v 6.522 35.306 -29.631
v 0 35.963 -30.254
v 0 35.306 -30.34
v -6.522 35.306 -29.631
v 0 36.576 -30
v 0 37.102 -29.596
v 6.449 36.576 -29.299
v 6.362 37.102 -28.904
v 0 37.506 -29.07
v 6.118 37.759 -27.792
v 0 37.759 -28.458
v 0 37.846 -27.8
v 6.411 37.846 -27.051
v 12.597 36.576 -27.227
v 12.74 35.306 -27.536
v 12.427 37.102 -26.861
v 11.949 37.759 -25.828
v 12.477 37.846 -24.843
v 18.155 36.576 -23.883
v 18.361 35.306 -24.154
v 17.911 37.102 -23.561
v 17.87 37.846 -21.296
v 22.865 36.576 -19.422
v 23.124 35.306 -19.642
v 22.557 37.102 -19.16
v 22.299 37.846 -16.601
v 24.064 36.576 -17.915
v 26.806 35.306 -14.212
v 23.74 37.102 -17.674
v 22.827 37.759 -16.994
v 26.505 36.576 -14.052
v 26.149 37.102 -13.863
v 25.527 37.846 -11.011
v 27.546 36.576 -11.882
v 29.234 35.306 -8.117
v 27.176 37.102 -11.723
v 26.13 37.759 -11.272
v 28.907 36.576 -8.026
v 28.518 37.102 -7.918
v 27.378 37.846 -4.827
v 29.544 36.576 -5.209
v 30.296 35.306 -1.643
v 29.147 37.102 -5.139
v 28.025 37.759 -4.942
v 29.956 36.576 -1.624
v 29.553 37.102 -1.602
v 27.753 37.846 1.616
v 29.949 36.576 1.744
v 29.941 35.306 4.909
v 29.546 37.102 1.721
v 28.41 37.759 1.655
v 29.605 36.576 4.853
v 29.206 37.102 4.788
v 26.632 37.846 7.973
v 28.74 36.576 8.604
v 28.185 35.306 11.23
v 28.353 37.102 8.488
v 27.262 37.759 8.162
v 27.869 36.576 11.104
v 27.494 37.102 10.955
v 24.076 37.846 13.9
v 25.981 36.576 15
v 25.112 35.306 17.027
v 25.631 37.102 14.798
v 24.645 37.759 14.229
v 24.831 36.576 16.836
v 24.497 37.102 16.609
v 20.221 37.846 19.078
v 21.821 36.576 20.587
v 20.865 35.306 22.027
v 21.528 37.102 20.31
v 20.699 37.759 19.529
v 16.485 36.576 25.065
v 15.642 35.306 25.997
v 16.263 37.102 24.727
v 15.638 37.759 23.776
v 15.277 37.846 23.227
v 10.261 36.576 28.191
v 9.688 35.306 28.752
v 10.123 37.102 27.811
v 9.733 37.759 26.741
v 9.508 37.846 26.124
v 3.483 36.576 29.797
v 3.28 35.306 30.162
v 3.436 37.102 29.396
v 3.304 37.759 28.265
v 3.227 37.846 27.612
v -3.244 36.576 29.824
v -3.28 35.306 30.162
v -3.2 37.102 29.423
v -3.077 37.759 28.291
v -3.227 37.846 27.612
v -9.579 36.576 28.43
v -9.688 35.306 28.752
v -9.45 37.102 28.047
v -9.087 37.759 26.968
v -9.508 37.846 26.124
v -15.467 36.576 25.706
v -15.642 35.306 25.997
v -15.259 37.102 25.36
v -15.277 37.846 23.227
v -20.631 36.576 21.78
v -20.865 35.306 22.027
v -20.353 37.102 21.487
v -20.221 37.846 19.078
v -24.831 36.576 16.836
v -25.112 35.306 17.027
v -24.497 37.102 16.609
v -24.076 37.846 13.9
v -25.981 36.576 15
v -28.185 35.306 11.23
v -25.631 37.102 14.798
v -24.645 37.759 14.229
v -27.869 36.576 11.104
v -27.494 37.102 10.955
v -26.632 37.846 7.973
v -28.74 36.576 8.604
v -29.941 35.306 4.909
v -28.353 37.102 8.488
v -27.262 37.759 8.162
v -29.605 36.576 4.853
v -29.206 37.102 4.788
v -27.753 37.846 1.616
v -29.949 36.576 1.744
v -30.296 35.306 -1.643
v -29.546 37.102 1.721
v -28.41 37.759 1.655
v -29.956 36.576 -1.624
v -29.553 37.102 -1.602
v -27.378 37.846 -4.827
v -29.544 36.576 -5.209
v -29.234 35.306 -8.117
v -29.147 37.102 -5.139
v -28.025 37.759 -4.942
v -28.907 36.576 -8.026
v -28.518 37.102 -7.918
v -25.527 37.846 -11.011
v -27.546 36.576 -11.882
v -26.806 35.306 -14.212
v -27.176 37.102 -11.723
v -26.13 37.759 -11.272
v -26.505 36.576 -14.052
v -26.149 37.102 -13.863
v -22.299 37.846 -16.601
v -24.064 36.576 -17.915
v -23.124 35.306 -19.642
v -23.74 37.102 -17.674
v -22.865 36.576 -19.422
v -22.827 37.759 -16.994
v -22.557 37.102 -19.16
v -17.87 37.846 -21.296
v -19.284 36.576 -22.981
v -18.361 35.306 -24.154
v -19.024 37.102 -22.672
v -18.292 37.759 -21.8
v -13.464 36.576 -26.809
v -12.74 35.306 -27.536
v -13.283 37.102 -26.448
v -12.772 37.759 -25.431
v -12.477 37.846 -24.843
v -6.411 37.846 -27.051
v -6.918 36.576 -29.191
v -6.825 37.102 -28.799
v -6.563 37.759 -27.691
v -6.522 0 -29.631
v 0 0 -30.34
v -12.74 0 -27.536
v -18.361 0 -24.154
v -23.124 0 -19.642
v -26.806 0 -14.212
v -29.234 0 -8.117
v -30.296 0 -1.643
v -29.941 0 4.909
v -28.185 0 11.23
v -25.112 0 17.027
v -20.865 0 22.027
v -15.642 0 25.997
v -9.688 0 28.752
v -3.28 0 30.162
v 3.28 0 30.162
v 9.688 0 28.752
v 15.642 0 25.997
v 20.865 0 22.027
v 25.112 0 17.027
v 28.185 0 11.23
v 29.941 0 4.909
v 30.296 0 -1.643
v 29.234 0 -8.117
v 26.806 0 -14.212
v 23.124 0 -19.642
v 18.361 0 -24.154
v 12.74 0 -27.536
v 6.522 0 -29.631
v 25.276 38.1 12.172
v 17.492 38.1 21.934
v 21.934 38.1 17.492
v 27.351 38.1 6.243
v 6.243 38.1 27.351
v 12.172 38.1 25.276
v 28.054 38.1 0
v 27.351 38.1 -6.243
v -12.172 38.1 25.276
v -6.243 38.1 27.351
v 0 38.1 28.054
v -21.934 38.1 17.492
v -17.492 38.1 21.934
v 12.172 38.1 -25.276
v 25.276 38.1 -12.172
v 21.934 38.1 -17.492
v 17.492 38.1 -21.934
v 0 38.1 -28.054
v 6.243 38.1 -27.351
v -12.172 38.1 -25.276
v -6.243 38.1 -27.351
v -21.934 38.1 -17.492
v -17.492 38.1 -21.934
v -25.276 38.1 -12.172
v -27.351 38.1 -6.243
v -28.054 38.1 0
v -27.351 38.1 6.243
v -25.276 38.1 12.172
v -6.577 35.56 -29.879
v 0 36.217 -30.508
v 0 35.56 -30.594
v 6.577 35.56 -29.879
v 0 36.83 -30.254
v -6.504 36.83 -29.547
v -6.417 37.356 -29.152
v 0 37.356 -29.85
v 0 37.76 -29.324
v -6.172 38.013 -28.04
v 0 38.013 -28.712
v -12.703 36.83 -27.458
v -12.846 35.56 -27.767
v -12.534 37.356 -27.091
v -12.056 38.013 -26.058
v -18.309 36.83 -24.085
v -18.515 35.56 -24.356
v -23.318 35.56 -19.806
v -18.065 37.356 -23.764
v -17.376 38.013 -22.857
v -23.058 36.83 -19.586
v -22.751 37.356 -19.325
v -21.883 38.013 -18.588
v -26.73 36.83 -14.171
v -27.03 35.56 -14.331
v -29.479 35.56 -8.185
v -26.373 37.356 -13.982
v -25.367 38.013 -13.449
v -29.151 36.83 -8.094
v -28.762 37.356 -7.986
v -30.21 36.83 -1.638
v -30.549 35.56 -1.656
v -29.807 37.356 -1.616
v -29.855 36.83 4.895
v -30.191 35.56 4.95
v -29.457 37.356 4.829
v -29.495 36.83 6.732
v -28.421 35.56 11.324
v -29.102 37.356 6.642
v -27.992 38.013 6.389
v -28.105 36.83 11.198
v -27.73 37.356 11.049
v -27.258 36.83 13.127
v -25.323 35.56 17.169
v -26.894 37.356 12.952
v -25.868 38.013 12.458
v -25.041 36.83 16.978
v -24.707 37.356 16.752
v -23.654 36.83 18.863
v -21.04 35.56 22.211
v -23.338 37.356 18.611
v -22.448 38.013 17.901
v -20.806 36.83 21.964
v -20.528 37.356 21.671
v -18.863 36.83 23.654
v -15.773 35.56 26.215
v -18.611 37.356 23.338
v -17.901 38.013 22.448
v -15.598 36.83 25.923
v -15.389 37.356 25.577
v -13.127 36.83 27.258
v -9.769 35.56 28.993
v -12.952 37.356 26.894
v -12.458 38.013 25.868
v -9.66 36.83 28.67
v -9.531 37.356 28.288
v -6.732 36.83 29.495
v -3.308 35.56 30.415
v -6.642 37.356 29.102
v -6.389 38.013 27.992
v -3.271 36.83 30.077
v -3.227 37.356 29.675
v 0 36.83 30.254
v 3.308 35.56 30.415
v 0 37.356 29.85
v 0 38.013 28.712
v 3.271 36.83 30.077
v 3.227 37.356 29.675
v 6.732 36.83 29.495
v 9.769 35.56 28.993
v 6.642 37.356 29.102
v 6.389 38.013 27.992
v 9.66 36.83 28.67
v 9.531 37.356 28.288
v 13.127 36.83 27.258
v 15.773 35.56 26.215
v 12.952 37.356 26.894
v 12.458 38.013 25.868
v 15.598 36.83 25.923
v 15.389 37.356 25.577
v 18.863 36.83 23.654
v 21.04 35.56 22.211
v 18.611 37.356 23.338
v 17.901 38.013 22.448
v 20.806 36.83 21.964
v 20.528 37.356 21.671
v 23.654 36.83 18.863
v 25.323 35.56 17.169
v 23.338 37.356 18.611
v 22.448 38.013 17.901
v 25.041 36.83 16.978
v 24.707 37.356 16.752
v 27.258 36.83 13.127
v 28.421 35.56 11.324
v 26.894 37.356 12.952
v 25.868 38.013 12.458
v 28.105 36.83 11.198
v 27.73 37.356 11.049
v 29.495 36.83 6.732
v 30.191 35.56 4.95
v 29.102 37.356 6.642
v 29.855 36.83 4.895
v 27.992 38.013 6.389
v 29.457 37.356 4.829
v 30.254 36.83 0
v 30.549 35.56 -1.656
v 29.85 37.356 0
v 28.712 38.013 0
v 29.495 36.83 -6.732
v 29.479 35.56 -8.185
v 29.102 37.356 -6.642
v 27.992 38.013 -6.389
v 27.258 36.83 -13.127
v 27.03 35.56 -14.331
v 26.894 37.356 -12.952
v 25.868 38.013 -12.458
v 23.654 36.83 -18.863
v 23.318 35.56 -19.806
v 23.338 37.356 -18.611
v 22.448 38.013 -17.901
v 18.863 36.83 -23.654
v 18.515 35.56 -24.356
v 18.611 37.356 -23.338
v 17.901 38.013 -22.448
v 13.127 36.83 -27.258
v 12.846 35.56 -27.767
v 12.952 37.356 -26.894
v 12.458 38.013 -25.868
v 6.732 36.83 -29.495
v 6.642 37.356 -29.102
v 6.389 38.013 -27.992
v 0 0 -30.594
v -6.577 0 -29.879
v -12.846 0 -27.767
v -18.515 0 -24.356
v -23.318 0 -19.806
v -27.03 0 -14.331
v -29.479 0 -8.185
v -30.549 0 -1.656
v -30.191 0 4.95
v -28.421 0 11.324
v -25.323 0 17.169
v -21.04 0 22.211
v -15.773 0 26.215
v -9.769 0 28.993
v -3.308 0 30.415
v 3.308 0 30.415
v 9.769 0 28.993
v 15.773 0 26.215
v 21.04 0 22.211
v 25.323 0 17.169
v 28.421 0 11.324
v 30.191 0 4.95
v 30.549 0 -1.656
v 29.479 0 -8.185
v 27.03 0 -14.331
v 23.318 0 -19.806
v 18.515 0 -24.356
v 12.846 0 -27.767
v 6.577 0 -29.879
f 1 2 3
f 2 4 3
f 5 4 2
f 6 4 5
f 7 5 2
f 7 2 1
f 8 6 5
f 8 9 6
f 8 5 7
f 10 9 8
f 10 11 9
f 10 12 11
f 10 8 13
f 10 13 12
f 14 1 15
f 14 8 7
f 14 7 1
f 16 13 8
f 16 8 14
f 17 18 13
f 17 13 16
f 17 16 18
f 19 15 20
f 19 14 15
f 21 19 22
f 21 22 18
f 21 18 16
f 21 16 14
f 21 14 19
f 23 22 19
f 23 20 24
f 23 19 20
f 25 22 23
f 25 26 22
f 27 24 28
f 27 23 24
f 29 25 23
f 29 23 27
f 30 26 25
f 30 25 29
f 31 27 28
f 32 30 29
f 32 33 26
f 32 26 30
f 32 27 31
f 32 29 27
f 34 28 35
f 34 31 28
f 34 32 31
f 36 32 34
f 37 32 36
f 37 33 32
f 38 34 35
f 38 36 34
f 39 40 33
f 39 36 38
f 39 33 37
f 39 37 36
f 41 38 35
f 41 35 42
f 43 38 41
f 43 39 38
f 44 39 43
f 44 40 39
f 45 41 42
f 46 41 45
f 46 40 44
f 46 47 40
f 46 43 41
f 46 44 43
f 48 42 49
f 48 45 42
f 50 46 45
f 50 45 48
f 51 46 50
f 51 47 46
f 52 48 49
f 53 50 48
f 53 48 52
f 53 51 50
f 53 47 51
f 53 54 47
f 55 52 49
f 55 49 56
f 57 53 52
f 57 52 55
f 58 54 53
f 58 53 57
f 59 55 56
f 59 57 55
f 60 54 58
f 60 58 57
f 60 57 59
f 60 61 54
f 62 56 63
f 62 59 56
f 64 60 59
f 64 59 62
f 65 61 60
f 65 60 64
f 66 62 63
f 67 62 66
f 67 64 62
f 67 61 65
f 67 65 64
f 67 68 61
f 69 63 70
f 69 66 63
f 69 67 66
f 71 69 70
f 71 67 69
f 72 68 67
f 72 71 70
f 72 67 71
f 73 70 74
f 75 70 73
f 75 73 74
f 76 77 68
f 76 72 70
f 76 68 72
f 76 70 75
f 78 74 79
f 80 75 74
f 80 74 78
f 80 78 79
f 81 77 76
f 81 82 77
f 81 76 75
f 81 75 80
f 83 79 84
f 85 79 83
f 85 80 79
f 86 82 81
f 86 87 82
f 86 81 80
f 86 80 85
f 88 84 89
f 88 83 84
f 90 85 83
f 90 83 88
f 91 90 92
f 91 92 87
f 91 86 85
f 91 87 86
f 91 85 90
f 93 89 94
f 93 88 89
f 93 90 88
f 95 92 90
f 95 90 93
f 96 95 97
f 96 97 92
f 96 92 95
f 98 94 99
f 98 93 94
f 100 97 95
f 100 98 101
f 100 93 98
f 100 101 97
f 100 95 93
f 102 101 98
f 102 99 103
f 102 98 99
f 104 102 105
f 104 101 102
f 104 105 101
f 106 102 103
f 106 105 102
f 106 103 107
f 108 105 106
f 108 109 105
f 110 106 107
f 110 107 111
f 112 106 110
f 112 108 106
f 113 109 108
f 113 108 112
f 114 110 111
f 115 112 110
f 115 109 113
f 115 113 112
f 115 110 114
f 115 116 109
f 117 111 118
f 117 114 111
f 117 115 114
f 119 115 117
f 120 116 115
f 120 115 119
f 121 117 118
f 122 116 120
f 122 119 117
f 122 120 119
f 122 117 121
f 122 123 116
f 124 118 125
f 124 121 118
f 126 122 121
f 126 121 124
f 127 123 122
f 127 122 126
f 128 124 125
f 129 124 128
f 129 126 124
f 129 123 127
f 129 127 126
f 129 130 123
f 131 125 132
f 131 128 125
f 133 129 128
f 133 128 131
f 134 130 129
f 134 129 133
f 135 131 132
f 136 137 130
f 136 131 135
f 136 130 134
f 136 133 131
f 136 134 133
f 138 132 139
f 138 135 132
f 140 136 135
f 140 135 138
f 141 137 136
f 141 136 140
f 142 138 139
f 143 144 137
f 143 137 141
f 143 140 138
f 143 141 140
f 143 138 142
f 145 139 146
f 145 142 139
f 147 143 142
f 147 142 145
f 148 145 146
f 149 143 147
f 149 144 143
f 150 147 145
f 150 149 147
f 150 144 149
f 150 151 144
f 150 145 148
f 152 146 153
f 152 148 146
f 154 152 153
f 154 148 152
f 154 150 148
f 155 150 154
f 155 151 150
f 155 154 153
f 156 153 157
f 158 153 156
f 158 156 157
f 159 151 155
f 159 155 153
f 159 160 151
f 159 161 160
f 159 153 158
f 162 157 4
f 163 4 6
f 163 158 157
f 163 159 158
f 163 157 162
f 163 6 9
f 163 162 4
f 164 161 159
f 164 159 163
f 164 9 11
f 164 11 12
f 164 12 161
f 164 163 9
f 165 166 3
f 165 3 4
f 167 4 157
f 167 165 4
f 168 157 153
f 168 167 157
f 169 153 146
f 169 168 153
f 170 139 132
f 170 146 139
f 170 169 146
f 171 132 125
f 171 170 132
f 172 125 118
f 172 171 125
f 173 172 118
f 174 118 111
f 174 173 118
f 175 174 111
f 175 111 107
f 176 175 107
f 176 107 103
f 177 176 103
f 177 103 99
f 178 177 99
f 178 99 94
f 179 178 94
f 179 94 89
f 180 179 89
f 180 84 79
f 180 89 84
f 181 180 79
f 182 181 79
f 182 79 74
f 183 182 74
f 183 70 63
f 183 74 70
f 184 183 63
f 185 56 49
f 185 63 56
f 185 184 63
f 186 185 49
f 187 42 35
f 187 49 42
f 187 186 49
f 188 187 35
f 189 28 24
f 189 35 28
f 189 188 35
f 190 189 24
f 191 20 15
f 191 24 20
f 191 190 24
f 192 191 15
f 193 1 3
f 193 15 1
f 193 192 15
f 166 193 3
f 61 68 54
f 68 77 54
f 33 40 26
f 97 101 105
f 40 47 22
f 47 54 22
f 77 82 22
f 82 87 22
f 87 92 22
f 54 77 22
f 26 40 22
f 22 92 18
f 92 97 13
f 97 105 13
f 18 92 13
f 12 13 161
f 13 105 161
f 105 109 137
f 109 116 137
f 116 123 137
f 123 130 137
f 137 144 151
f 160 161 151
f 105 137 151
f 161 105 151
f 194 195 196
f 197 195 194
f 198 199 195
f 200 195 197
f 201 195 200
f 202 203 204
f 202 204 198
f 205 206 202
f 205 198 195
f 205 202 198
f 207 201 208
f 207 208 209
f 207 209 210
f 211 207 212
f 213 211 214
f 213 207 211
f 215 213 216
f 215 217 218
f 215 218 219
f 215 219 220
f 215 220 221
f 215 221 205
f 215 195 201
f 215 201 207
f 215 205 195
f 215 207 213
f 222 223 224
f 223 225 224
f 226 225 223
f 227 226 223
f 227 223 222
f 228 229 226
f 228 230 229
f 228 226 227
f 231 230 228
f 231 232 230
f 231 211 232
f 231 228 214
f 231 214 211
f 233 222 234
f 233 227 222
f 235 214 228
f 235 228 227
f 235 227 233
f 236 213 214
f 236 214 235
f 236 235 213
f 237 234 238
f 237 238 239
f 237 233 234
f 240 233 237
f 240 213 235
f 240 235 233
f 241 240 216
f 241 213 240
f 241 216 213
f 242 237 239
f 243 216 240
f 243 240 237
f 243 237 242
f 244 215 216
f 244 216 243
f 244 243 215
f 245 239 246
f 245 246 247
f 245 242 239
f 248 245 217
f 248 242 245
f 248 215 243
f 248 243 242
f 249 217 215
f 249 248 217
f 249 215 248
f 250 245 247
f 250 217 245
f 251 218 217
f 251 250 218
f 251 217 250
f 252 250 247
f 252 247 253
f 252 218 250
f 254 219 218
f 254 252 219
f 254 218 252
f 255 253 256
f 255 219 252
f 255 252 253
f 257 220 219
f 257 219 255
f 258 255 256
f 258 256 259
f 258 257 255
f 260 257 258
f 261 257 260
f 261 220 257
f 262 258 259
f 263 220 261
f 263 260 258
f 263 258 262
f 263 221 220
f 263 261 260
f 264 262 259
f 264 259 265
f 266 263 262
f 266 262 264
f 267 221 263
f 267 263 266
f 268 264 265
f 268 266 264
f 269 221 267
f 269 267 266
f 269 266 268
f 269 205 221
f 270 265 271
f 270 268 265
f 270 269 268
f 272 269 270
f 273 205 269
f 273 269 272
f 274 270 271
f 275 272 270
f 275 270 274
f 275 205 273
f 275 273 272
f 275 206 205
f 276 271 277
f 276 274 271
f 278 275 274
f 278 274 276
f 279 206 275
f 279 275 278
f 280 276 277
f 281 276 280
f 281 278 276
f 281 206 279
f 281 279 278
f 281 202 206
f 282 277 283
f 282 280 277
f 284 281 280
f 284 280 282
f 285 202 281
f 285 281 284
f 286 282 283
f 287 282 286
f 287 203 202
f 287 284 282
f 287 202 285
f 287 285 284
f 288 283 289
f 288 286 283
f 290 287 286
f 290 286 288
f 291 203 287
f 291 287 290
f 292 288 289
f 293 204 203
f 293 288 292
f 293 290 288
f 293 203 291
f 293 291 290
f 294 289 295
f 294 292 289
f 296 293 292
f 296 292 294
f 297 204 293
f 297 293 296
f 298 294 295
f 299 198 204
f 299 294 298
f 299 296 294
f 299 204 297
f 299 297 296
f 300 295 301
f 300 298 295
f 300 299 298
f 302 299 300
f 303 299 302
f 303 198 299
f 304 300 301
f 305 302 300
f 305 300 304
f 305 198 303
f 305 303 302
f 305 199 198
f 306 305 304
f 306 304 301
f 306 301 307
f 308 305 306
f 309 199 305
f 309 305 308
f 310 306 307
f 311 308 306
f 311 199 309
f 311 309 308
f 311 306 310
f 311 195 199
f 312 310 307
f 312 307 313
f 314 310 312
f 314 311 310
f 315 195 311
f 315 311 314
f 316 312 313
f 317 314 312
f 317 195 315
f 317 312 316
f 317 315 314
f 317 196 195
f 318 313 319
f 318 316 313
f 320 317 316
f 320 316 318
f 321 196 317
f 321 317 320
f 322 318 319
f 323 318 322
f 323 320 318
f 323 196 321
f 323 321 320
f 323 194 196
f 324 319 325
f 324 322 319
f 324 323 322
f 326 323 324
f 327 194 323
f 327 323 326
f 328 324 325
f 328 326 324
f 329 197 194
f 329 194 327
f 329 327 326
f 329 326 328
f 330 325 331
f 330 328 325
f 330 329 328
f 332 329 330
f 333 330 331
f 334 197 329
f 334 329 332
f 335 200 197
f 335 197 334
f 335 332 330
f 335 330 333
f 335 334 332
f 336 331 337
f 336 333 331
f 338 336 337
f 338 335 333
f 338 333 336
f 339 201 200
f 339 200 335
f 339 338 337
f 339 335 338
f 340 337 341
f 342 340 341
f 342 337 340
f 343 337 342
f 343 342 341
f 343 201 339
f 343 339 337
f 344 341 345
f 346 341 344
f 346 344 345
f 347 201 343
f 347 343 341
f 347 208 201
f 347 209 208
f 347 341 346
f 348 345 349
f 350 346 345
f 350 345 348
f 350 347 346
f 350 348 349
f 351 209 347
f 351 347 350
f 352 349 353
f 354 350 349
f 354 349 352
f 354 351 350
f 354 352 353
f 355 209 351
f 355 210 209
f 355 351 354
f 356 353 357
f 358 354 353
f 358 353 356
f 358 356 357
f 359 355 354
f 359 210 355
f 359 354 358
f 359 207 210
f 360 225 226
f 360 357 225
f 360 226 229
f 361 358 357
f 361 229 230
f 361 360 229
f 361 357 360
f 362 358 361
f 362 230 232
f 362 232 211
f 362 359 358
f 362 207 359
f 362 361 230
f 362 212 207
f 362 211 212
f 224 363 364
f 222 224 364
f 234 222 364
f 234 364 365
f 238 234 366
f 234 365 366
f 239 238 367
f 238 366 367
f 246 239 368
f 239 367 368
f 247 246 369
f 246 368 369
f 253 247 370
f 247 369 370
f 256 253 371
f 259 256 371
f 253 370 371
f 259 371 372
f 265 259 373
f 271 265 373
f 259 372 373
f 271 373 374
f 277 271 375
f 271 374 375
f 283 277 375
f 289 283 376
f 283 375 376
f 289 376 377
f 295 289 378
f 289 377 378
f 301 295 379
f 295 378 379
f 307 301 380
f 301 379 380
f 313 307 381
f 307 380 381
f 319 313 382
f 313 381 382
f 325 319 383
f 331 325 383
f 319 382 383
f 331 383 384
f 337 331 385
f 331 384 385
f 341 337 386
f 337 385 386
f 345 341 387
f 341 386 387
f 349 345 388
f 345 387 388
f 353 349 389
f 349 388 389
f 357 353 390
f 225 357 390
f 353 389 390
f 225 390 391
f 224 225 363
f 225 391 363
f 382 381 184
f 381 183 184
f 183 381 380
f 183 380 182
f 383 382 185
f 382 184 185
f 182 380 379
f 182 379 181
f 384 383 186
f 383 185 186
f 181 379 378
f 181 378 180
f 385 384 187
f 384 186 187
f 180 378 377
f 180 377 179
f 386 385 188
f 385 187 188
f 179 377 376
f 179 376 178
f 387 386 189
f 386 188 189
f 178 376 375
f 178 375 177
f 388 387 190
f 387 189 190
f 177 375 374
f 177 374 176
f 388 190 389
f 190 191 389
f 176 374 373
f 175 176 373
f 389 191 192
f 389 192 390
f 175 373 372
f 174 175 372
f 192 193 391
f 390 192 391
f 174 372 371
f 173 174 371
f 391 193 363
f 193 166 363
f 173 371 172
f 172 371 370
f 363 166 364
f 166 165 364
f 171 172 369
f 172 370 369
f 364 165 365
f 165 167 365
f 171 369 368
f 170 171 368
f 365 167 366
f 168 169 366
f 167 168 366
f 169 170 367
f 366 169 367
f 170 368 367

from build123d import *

# Parameters (mm, degrees)
SKETCH1_R           = 30.5943
BOSS_EXTRUDE1_DEPTH = 38.1
SHELL1_T            = -0.254
FILLET1_R           = 2.54
FILLET2_R           = 2.54


with BuildPart() as part:
    # Sketch1 → Boss-Extrude1 (new body)
    with BuildSketch(Plane(origin=(0, 0, 0), x_dir=(1, 0, 0), z_dir=(0, 1, 0))):
        with Locations(Location((0, 0, 0), (0, 0, 90))):
            Circle(SKETCH1_R)
    extrude(amount=BOSS_EXTRUDE1_DEPTH)

    # Shell1
    shell1_openings = [part.faces().sort_by_distance(p)[0] for p in [
        (0, 0, 0),
    ]]
    offset(amount=SHELL1_T, openings=shell1_openings, kind=Kind.INTERSECTION)

    # Fillet1
    fillet1_edges = [part.edges().sort_by_distance(p)[0] for p in [
        (0, 37.846, 30.3403),
    ]]
    fillet(fillet1_edges, radius=FILLET1_R)

    # Fillet2
    fillet2_edges = [part.edges().sort_by_distance(p)[0] for p in [
        (0, 38.1, 30.5943),
    ]]
    fillet(fillet2_edges, radius=FILLET2_R)


solid = part.part
